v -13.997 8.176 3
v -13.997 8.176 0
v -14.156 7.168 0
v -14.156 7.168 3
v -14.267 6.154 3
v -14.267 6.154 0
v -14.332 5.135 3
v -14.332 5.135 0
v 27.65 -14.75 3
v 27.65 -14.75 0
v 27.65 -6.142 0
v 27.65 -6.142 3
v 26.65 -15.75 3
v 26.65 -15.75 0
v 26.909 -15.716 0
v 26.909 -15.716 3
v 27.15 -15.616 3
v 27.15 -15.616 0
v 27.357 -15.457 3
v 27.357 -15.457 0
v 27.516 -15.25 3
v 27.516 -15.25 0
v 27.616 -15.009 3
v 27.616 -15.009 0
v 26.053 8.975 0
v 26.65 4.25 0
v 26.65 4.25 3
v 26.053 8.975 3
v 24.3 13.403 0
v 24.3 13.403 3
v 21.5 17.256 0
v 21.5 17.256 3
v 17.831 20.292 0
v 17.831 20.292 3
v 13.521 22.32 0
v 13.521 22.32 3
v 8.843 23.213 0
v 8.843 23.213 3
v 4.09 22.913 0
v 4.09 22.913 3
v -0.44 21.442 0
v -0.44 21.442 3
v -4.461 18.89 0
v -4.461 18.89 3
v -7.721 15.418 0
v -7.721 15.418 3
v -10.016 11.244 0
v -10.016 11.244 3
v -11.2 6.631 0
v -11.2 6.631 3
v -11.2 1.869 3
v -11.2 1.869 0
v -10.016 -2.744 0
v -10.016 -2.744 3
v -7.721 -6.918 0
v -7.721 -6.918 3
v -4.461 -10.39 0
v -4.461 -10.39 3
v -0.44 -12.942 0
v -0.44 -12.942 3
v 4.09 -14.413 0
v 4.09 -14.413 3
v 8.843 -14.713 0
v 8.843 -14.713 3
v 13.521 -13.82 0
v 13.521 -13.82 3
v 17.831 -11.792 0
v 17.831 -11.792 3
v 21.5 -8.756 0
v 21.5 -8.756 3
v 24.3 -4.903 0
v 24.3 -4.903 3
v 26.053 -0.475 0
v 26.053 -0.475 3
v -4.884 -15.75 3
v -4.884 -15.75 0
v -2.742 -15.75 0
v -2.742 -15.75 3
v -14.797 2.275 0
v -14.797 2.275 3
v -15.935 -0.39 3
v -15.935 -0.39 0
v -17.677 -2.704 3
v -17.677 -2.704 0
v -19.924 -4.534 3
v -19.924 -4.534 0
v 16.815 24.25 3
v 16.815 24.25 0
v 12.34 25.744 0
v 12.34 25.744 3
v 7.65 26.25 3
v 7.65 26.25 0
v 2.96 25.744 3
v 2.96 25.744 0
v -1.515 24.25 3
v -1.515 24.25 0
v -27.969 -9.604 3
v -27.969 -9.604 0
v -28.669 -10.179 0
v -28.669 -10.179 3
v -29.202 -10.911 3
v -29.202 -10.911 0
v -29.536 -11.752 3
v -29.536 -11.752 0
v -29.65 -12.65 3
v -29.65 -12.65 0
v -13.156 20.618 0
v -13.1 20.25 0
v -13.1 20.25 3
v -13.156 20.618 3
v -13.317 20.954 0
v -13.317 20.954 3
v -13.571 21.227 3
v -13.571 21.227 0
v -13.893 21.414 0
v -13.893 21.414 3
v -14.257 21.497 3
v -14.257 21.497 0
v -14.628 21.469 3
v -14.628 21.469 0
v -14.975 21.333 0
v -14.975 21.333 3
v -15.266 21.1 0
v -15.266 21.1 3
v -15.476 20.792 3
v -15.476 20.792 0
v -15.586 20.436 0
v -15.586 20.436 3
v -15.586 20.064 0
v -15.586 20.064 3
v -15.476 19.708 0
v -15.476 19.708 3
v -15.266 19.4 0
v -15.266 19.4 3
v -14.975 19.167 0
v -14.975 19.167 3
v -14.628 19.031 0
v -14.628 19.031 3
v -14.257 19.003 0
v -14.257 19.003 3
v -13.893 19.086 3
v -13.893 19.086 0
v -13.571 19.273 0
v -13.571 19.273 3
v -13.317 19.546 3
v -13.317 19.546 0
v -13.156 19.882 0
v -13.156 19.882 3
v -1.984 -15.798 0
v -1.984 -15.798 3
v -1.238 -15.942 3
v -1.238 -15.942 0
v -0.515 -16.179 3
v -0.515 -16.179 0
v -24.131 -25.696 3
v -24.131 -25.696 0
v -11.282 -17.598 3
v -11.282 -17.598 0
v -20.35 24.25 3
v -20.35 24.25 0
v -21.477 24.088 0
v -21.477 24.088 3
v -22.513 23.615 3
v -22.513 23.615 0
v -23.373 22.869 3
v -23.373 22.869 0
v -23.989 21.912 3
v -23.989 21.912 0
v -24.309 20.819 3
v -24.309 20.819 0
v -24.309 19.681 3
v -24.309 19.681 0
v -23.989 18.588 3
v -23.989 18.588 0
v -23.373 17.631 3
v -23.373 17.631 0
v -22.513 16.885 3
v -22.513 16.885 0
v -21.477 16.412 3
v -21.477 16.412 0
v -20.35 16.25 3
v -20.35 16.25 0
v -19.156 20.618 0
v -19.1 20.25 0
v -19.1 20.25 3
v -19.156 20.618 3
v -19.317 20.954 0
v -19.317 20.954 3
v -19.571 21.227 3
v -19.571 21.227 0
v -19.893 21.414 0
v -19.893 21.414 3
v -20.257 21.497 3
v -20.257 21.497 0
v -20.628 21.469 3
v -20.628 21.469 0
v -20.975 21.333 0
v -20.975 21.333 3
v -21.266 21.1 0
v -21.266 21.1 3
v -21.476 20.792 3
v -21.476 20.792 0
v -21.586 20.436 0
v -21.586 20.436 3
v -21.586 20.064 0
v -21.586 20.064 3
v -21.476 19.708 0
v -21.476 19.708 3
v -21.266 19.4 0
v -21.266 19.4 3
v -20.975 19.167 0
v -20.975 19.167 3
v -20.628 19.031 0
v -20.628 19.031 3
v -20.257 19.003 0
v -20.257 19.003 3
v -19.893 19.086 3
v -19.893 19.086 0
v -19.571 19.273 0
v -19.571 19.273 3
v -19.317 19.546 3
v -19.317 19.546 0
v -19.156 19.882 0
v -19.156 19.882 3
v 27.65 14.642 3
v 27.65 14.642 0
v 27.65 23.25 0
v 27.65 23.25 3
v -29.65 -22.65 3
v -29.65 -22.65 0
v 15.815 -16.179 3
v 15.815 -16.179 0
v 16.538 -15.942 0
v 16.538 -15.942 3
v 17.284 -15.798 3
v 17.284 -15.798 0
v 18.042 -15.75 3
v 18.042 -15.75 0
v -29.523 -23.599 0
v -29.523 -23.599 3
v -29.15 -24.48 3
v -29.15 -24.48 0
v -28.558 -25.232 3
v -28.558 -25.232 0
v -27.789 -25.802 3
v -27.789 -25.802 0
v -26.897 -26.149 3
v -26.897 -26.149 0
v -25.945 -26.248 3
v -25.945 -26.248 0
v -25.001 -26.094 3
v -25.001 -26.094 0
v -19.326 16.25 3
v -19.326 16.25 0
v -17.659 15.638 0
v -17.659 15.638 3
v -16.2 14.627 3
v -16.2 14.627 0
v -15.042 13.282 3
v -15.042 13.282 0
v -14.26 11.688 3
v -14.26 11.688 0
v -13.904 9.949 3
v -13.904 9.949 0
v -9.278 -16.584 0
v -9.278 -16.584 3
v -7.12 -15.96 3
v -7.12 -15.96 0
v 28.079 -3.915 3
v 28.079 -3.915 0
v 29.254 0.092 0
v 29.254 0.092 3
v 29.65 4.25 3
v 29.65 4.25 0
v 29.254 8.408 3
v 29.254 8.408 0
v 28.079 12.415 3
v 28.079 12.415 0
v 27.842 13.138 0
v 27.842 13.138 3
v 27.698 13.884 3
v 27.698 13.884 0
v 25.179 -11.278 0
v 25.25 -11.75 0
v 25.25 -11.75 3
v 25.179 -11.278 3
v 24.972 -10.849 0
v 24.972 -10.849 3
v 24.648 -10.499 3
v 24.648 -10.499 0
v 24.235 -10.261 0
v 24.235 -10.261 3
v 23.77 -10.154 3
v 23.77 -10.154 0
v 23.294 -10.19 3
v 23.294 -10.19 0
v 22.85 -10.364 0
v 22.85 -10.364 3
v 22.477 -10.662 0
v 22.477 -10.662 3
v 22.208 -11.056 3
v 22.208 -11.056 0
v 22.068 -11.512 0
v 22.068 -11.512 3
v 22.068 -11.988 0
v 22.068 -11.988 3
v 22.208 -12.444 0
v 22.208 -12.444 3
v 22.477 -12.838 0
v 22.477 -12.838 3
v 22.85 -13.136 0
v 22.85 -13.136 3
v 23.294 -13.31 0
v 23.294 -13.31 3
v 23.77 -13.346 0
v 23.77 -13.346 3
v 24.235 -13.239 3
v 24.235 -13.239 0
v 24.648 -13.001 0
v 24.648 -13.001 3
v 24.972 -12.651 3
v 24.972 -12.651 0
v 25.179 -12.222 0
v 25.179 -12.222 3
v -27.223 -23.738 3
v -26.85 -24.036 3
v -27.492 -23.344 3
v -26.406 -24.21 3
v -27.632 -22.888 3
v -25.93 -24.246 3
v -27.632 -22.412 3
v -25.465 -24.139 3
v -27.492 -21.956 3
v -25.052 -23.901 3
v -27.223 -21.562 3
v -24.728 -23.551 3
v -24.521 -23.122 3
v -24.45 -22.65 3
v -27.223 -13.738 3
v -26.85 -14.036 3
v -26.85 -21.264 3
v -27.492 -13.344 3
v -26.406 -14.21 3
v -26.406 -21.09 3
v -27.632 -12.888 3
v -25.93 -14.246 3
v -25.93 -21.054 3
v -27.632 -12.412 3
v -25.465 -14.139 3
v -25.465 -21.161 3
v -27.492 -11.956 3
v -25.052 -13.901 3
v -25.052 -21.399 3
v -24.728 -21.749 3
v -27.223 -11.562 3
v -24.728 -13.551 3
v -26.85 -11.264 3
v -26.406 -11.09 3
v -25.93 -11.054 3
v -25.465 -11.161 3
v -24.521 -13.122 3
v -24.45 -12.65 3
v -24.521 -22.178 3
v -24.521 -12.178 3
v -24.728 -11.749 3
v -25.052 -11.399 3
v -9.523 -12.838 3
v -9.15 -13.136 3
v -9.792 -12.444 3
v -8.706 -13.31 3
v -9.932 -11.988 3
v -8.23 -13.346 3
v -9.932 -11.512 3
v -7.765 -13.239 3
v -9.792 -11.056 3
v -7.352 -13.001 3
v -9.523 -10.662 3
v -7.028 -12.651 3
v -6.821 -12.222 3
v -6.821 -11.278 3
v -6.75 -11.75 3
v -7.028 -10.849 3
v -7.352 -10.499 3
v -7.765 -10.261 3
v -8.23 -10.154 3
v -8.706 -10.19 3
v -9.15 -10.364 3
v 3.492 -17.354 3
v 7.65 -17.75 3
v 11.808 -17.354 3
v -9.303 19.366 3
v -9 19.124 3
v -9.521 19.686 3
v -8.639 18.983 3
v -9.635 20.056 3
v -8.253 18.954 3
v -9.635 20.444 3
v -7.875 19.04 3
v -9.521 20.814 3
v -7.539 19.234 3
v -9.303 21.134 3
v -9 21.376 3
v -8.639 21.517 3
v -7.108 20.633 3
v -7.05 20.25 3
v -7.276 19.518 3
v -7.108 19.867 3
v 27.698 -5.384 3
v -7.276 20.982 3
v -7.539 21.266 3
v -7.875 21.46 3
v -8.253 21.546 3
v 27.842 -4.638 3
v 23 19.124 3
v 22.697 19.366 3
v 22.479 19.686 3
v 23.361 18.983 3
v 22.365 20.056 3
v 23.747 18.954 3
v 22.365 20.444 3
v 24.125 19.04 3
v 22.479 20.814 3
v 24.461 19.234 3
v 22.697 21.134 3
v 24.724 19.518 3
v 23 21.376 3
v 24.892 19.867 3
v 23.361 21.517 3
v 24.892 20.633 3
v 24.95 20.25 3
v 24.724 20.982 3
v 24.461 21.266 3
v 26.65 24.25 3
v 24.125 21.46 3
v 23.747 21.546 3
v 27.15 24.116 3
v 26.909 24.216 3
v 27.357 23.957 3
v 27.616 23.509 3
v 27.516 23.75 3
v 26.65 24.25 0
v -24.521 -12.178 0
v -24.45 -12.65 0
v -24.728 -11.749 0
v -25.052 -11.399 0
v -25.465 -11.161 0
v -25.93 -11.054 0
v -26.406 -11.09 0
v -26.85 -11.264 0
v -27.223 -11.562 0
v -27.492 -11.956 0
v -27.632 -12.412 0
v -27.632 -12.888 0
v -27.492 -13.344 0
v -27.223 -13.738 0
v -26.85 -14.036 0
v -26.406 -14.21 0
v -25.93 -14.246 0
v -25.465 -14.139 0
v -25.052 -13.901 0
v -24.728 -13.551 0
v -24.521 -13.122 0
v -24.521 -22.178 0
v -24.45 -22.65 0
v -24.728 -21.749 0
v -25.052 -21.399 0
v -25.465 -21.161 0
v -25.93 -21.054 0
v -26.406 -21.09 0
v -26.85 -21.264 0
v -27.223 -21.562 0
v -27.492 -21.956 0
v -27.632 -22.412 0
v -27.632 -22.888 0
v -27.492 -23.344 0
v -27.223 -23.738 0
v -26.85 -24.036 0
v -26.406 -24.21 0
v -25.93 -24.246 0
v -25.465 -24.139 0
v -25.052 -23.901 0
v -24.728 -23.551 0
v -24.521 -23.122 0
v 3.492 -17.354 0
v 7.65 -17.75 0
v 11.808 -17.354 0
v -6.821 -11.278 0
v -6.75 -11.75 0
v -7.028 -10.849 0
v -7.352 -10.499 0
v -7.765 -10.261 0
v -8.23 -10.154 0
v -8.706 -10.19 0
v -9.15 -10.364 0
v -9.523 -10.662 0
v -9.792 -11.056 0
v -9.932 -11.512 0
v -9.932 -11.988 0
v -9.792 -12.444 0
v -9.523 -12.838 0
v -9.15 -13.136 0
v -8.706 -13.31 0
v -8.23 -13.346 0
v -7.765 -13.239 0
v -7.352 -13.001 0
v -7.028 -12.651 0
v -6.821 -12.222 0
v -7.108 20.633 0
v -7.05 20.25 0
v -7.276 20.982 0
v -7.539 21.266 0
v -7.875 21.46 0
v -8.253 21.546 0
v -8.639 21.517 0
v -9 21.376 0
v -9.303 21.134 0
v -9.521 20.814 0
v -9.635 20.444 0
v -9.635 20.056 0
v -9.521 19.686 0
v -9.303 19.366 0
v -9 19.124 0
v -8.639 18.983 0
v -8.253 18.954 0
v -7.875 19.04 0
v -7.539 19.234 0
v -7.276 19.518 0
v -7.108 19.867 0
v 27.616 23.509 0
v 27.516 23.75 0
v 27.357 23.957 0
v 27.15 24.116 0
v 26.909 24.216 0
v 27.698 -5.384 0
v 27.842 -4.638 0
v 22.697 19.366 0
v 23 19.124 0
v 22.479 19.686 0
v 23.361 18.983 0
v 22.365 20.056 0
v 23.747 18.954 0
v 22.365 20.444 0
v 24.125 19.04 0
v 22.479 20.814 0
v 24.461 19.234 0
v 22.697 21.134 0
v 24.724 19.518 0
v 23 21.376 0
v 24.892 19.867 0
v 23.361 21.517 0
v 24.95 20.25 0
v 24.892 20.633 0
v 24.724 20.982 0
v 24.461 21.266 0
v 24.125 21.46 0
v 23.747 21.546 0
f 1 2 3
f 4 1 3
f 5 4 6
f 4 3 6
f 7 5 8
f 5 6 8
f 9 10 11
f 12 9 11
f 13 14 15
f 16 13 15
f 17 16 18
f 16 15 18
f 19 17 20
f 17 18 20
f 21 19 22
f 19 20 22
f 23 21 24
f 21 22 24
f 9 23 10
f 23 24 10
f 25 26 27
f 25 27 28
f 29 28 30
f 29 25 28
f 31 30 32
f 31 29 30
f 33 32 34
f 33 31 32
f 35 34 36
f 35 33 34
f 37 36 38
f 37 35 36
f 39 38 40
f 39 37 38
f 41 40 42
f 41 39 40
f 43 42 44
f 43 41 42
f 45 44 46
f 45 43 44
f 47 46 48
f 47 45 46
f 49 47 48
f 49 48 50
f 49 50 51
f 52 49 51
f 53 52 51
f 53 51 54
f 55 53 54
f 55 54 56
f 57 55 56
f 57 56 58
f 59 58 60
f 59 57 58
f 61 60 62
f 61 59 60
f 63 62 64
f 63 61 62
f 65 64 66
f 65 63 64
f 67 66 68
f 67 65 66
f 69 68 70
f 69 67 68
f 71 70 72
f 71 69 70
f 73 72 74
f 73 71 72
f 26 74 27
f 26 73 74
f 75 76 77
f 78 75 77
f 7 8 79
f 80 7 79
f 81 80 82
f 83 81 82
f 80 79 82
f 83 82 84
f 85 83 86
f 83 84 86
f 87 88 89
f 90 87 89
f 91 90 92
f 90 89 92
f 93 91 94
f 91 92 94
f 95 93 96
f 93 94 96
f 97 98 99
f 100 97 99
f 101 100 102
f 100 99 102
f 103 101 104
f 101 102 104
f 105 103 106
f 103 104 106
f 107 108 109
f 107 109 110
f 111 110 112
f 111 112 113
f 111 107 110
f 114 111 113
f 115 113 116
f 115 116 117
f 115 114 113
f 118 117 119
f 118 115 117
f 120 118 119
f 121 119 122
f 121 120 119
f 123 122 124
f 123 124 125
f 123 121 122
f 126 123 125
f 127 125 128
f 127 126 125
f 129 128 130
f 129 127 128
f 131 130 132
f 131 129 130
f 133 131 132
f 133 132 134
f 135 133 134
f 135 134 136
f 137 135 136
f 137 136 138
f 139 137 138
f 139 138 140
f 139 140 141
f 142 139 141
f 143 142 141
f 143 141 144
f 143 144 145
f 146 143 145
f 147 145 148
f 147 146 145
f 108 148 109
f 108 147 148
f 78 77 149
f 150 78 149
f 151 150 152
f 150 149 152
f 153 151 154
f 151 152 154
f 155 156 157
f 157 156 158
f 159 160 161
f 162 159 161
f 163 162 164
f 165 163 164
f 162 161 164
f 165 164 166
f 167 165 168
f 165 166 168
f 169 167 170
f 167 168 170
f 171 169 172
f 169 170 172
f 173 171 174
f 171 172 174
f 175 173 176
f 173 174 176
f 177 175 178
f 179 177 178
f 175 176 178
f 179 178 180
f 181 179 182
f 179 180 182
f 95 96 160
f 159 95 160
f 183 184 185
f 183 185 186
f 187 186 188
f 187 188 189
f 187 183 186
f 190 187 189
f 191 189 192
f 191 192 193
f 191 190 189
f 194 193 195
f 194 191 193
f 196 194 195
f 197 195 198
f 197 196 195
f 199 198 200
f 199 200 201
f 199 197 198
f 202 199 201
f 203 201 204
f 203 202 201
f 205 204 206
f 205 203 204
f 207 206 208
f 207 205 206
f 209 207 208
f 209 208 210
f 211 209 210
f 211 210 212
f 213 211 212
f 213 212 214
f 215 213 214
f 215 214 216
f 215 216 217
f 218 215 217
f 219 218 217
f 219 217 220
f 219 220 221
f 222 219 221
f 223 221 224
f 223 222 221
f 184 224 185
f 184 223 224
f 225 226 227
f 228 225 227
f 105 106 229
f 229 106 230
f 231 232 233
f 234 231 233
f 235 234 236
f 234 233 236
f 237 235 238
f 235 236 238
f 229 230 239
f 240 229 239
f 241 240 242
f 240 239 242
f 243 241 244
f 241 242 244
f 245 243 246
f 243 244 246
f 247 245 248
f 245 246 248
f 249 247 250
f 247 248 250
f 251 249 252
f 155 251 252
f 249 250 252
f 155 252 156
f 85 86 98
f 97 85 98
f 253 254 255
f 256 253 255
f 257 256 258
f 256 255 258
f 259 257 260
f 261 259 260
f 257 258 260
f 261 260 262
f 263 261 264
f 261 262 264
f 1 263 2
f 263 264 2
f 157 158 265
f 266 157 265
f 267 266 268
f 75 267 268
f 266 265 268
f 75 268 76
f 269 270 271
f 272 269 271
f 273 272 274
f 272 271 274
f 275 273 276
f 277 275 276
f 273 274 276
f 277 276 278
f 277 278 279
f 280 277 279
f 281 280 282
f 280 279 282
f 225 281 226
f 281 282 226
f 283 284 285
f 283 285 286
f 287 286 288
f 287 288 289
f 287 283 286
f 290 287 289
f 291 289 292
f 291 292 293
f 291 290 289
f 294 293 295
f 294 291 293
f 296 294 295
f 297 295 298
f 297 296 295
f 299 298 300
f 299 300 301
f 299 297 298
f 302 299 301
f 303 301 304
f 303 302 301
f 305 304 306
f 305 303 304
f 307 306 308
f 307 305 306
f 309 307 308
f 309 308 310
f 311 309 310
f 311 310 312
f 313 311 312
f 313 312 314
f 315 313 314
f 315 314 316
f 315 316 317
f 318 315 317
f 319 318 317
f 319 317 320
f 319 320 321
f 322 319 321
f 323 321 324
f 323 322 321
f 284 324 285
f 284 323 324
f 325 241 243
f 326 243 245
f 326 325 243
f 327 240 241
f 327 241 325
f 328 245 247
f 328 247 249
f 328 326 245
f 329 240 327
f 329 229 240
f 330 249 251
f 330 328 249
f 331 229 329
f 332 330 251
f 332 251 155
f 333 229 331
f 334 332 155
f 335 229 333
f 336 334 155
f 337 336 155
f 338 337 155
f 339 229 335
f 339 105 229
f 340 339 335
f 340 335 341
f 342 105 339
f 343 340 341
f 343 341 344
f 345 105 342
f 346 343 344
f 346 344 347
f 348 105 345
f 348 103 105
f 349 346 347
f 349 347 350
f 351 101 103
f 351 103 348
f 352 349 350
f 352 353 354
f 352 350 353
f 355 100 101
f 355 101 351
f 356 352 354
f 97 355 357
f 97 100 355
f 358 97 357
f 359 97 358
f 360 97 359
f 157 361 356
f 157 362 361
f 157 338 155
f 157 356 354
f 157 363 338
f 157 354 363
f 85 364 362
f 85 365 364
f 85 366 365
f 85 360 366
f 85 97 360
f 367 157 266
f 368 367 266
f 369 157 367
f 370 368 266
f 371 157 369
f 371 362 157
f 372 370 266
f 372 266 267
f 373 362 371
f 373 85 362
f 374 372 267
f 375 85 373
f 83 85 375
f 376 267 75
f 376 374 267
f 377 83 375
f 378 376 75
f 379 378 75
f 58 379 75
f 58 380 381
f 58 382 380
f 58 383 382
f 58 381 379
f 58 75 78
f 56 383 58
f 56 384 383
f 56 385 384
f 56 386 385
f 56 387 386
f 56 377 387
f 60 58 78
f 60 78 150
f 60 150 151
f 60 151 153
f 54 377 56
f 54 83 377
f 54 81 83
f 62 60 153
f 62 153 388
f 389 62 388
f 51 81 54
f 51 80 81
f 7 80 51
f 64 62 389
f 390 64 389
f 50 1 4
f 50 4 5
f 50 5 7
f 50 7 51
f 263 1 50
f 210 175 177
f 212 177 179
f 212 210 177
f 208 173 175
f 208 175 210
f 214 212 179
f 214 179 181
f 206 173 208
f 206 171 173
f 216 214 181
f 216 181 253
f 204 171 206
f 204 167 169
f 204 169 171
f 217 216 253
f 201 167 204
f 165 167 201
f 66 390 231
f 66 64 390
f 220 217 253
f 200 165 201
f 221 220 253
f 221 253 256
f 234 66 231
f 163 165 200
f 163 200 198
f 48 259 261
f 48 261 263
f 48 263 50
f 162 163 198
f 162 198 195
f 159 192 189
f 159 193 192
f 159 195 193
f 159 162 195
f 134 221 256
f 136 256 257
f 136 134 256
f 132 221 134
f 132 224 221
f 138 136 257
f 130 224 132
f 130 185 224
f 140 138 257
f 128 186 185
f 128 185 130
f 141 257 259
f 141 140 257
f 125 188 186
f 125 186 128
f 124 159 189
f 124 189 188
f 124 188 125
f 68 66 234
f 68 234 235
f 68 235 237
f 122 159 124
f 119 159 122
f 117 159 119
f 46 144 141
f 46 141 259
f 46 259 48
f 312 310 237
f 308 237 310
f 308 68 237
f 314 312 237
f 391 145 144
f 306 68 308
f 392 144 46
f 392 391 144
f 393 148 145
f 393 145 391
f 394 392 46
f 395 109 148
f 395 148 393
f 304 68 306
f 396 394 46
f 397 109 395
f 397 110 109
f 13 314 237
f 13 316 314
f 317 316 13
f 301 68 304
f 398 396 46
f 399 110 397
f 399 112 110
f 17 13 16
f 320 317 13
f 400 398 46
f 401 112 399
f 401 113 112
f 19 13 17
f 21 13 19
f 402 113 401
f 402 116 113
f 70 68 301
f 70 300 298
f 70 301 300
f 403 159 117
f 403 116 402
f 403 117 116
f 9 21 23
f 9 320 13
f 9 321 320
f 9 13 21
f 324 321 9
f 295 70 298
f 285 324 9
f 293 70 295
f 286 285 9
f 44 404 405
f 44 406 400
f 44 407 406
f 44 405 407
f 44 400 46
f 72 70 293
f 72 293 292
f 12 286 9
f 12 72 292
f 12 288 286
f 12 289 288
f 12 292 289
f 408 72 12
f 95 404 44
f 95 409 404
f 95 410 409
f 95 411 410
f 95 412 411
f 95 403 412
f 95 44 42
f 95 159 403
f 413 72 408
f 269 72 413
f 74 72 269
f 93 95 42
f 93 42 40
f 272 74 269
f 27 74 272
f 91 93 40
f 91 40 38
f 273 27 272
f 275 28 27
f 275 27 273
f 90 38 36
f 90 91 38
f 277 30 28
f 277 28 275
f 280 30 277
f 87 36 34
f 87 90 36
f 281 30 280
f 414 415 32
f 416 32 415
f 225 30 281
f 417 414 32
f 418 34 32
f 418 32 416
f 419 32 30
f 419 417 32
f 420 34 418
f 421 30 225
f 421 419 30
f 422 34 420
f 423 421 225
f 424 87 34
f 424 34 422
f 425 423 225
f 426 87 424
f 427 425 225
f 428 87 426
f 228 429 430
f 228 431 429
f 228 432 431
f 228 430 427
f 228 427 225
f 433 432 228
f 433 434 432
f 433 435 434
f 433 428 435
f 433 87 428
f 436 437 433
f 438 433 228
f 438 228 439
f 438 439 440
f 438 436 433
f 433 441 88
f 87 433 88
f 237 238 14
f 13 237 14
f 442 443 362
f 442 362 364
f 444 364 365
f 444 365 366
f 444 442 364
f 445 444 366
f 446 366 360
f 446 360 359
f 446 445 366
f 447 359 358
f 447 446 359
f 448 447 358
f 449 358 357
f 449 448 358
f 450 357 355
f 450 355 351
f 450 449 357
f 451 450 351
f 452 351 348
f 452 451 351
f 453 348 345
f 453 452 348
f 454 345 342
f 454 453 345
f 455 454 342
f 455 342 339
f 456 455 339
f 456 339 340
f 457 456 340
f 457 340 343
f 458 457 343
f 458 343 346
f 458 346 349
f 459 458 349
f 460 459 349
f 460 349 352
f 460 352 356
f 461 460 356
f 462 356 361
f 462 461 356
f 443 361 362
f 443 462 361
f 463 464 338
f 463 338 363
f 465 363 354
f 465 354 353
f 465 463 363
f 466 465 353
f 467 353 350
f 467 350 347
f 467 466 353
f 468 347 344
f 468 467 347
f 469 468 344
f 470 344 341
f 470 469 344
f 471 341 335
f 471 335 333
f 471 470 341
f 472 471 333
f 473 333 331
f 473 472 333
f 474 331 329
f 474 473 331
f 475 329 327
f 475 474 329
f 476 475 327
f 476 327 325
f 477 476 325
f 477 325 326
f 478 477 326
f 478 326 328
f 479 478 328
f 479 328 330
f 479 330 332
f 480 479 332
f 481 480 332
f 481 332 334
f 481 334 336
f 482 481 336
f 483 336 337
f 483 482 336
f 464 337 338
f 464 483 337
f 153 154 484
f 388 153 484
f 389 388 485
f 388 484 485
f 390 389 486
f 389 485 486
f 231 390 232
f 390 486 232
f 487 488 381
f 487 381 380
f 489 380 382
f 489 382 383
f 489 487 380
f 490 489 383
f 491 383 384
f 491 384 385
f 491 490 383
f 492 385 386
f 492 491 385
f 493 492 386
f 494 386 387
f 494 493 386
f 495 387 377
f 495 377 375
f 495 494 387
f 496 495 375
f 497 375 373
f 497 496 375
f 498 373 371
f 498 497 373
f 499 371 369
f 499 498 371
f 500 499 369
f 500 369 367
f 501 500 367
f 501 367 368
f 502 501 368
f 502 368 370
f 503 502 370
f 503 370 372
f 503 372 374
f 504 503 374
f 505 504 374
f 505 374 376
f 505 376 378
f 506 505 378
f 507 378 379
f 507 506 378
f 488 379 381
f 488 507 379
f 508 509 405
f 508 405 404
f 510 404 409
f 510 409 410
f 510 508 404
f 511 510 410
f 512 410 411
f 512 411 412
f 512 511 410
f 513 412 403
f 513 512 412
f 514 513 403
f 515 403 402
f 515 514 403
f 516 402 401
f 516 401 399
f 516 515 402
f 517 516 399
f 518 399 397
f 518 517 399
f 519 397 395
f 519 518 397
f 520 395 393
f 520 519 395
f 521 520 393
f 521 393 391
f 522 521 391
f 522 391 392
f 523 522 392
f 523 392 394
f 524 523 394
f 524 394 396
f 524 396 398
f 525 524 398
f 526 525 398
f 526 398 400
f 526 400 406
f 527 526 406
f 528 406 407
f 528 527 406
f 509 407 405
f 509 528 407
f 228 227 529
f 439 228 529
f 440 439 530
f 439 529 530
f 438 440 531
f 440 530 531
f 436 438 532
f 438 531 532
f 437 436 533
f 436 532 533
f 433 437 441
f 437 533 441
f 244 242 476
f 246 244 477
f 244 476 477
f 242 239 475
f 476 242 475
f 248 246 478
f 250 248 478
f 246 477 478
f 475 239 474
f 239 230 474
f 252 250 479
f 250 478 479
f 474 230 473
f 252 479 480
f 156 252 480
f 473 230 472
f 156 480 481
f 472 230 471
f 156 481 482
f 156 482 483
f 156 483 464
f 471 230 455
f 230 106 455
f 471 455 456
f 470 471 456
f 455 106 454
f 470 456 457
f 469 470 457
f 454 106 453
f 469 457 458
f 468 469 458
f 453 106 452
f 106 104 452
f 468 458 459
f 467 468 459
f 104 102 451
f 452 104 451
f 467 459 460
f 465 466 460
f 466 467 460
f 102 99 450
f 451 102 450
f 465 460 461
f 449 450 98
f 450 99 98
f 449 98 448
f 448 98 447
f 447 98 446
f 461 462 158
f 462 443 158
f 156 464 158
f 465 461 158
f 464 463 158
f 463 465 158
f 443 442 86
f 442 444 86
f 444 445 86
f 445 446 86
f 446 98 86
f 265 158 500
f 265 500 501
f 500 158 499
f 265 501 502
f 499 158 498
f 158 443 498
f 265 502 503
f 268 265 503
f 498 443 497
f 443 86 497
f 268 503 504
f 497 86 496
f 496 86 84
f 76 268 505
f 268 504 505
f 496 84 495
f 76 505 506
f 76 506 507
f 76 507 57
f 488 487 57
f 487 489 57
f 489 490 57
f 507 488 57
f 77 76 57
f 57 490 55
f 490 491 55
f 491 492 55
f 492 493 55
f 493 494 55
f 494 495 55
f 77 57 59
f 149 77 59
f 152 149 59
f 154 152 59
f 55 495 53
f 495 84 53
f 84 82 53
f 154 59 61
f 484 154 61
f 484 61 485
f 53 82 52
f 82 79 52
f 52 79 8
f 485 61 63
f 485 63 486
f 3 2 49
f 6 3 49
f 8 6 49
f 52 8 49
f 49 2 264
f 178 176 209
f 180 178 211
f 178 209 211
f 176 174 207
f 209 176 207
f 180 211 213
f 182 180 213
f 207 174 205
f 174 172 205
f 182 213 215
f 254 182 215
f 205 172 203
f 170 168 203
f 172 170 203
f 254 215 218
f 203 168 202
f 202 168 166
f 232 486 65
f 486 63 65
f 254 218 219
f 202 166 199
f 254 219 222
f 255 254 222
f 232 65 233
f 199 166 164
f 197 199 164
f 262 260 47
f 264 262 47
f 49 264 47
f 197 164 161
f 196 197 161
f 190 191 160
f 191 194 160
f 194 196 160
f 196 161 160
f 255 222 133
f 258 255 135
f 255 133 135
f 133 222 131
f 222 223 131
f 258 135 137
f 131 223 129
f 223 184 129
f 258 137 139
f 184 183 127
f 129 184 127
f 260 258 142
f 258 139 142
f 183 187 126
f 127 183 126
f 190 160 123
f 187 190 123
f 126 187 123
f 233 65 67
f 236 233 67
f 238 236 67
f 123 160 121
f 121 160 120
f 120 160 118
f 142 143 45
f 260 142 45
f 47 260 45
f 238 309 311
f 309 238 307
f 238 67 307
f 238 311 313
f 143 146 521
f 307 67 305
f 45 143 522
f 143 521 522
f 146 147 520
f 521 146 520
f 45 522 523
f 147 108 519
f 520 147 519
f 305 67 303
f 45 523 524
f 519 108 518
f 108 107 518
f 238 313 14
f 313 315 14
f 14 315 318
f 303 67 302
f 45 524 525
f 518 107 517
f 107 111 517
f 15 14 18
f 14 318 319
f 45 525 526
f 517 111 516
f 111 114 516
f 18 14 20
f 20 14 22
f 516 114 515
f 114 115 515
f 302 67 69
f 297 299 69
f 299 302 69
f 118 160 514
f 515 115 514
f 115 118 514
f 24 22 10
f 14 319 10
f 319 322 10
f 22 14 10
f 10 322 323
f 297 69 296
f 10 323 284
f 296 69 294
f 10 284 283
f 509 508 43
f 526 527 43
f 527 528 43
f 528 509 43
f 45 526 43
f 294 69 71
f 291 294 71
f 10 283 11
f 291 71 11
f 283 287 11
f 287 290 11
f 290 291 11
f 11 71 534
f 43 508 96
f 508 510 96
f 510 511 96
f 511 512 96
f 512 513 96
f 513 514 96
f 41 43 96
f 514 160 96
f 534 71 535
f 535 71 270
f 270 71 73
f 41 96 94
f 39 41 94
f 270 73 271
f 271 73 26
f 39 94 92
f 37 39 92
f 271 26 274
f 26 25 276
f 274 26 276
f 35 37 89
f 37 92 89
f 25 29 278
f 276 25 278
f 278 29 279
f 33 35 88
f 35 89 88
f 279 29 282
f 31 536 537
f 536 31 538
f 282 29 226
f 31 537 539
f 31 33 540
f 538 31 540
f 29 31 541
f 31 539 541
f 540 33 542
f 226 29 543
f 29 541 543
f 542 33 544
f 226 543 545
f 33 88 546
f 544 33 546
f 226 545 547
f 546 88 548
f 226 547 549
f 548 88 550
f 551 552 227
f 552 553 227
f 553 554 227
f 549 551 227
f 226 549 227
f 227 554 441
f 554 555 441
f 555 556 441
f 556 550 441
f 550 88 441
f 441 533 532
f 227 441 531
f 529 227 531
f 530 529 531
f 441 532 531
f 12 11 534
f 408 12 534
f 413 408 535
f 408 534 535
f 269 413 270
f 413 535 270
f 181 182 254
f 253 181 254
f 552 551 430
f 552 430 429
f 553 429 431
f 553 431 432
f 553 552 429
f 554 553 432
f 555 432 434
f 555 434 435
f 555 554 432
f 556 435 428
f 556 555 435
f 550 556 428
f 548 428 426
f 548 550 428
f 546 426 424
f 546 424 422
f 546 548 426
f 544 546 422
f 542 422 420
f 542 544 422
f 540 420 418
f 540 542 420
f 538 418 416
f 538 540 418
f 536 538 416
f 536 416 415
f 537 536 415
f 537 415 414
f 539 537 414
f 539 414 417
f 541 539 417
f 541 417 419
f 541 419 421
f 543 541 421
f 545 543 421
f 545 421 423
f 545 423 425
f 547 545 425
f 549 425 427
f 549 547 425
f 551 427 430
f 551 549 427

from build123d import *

# Parameters (mm, degrees)
F0_R     = 1.6
F0_R_2   = 1.25
F0_R_3   = 1.3
F0_R_4   = 19
F1_DEPTH = 3


# Not quite as in the source:
# - ends of sketch curves that miss each other by under 0.0002 mm in the source are joined


with BuildPart() as f1:
    # F0 (on Top) → F1 (new body)
    with BuildSketch(Plane.XY):
        with BuildLine():
            ThreePointArc((26.65, -15.75), (27.3571067812, -15.4571067812), (27.65, -14.75))
            Line((27.65, -14.75), (27.65, -6.142305))
            ThreePointArc((27.65, -6.142305), (27.7581169954, -5.008411416), (28.0785715533, -3.9153822211))
            ThreePointArc((28.0785715533, -3.9153822211), (29.65, 4.25), (28.0785715, 12.4153821998))
            ThreePointArc((28.0785715, 12.4153821998), (27.7581169954, 13.508411416), (27.65, 14.642305))
            Line((27.65, 14.642305), (27.65, 23.25))
            ThreePointArc((27.65, 23.25), (27.3571067812, 23.9571067812), (26.65, 24.25))
            Line((26.65, 24.25), (16.815151, 24.25))
            ThreePointArc((16.815151, 24.25), (7.65, 26.25), (-1.5151510677, 24.2500001477))
            Line((-1.5151510677, 24.2500001477), (-20.35, 24.25))
            ThreePointArc((-20.35, 24.25), (-24.35, 20.25), (-20.35, 16.25))
            Line((-20.35, 16.25), (-19.325715, 16.25))
            ThreePointArc((-19.325715, 16.25), (-15.0422529035, 13.2818239509), (-13.9967824398, 8.1764238984))
            ThreePointArc((-13.9967824398, 8.1764238984), (-14.2174174888, 6.6616493047), (-14.3321842117, 5.1351990085))
            ThreePointArc((-14.3321842117, 5.1351990085), (-15.9346176497, -0.3896755352), (-19.9242382655, -4.5339435787))
            Line((-19.9242382655, -4.5339435787), (-27.969469, -9.604406))
            ThreePointArc((-27.969469, -9.604406), (-29.2019904282, -10.9107598382), (-29.65, -12.65))
            Line((-29.65, -12.65), (-29.65, -22.65))
            ThreePointArc((-29.65, -22.65), (-27.7892401618, -25.8019904282), (-24.1305313003, -25.6955935236))
            Line((-24.1305313003, -25.6955935236), (-11.282229, -17.598022))
            ThreePointArc((-11.282229, -17.598022), (-8.2138844175, -16.2212589687), (-4.884, -15.75))
            Line((-4.884, -15.75), (-2.742305, -15.75))
            ThreePointArc((-2.742305, -15.75), (-1.608411416, -15.8581169954), (-0.5153822211, -16.1785715533))
            ThreePointArc((-0.5153822211, -16.1785715533), (7.65, -17.75), (15.8153821998, -16.1785715))
            ThreePointArc((15.8153821998, -16.1785715), (16.908411416, -15.8581169954), (18.042305, -15.75))
            Line((18.042305, -15.75), (26.65, -15.75))
        make_face()
        with Locations((-26.05, -22.65)):
            Circle(F0_R, mode=Mode.SUBTRACT)
        with Locations((-26.05, -12.65)):
            Circle(F0_R, mode=Mode.SUBTRACT)
        with Locations((-8.35, -11.75)):
            Circle(F0_R, mode=Mode.SUBTRACT)
        with Locations((23.65, -11.75)):
            Circle(F0_R, mode=Mode.SUBTRACT)
        with Locations((-20.35, 20.25)):
            Circle(F0_R_2, mode=Mode.SUBTRACT)
        with Locations((-14.35, 20.25)):
            Circle(F0_R_2, mode=Mode.SUBTRACT)
        with Locations((-8.35, 20.25)):
            Circle(F0_R_3, mode=Mode.SUBTRACT)
        with Locations((7.65, 4.25)):
            Circle(F0_R_4, mode=Mode.SUBTRACT)
        with Locations((23.65, 20.25)):
            Circle(F0_R_3, mode=Mode.SUBTRACT)
    extrude(amount=F1_DEPTH)


solid = f1.part
